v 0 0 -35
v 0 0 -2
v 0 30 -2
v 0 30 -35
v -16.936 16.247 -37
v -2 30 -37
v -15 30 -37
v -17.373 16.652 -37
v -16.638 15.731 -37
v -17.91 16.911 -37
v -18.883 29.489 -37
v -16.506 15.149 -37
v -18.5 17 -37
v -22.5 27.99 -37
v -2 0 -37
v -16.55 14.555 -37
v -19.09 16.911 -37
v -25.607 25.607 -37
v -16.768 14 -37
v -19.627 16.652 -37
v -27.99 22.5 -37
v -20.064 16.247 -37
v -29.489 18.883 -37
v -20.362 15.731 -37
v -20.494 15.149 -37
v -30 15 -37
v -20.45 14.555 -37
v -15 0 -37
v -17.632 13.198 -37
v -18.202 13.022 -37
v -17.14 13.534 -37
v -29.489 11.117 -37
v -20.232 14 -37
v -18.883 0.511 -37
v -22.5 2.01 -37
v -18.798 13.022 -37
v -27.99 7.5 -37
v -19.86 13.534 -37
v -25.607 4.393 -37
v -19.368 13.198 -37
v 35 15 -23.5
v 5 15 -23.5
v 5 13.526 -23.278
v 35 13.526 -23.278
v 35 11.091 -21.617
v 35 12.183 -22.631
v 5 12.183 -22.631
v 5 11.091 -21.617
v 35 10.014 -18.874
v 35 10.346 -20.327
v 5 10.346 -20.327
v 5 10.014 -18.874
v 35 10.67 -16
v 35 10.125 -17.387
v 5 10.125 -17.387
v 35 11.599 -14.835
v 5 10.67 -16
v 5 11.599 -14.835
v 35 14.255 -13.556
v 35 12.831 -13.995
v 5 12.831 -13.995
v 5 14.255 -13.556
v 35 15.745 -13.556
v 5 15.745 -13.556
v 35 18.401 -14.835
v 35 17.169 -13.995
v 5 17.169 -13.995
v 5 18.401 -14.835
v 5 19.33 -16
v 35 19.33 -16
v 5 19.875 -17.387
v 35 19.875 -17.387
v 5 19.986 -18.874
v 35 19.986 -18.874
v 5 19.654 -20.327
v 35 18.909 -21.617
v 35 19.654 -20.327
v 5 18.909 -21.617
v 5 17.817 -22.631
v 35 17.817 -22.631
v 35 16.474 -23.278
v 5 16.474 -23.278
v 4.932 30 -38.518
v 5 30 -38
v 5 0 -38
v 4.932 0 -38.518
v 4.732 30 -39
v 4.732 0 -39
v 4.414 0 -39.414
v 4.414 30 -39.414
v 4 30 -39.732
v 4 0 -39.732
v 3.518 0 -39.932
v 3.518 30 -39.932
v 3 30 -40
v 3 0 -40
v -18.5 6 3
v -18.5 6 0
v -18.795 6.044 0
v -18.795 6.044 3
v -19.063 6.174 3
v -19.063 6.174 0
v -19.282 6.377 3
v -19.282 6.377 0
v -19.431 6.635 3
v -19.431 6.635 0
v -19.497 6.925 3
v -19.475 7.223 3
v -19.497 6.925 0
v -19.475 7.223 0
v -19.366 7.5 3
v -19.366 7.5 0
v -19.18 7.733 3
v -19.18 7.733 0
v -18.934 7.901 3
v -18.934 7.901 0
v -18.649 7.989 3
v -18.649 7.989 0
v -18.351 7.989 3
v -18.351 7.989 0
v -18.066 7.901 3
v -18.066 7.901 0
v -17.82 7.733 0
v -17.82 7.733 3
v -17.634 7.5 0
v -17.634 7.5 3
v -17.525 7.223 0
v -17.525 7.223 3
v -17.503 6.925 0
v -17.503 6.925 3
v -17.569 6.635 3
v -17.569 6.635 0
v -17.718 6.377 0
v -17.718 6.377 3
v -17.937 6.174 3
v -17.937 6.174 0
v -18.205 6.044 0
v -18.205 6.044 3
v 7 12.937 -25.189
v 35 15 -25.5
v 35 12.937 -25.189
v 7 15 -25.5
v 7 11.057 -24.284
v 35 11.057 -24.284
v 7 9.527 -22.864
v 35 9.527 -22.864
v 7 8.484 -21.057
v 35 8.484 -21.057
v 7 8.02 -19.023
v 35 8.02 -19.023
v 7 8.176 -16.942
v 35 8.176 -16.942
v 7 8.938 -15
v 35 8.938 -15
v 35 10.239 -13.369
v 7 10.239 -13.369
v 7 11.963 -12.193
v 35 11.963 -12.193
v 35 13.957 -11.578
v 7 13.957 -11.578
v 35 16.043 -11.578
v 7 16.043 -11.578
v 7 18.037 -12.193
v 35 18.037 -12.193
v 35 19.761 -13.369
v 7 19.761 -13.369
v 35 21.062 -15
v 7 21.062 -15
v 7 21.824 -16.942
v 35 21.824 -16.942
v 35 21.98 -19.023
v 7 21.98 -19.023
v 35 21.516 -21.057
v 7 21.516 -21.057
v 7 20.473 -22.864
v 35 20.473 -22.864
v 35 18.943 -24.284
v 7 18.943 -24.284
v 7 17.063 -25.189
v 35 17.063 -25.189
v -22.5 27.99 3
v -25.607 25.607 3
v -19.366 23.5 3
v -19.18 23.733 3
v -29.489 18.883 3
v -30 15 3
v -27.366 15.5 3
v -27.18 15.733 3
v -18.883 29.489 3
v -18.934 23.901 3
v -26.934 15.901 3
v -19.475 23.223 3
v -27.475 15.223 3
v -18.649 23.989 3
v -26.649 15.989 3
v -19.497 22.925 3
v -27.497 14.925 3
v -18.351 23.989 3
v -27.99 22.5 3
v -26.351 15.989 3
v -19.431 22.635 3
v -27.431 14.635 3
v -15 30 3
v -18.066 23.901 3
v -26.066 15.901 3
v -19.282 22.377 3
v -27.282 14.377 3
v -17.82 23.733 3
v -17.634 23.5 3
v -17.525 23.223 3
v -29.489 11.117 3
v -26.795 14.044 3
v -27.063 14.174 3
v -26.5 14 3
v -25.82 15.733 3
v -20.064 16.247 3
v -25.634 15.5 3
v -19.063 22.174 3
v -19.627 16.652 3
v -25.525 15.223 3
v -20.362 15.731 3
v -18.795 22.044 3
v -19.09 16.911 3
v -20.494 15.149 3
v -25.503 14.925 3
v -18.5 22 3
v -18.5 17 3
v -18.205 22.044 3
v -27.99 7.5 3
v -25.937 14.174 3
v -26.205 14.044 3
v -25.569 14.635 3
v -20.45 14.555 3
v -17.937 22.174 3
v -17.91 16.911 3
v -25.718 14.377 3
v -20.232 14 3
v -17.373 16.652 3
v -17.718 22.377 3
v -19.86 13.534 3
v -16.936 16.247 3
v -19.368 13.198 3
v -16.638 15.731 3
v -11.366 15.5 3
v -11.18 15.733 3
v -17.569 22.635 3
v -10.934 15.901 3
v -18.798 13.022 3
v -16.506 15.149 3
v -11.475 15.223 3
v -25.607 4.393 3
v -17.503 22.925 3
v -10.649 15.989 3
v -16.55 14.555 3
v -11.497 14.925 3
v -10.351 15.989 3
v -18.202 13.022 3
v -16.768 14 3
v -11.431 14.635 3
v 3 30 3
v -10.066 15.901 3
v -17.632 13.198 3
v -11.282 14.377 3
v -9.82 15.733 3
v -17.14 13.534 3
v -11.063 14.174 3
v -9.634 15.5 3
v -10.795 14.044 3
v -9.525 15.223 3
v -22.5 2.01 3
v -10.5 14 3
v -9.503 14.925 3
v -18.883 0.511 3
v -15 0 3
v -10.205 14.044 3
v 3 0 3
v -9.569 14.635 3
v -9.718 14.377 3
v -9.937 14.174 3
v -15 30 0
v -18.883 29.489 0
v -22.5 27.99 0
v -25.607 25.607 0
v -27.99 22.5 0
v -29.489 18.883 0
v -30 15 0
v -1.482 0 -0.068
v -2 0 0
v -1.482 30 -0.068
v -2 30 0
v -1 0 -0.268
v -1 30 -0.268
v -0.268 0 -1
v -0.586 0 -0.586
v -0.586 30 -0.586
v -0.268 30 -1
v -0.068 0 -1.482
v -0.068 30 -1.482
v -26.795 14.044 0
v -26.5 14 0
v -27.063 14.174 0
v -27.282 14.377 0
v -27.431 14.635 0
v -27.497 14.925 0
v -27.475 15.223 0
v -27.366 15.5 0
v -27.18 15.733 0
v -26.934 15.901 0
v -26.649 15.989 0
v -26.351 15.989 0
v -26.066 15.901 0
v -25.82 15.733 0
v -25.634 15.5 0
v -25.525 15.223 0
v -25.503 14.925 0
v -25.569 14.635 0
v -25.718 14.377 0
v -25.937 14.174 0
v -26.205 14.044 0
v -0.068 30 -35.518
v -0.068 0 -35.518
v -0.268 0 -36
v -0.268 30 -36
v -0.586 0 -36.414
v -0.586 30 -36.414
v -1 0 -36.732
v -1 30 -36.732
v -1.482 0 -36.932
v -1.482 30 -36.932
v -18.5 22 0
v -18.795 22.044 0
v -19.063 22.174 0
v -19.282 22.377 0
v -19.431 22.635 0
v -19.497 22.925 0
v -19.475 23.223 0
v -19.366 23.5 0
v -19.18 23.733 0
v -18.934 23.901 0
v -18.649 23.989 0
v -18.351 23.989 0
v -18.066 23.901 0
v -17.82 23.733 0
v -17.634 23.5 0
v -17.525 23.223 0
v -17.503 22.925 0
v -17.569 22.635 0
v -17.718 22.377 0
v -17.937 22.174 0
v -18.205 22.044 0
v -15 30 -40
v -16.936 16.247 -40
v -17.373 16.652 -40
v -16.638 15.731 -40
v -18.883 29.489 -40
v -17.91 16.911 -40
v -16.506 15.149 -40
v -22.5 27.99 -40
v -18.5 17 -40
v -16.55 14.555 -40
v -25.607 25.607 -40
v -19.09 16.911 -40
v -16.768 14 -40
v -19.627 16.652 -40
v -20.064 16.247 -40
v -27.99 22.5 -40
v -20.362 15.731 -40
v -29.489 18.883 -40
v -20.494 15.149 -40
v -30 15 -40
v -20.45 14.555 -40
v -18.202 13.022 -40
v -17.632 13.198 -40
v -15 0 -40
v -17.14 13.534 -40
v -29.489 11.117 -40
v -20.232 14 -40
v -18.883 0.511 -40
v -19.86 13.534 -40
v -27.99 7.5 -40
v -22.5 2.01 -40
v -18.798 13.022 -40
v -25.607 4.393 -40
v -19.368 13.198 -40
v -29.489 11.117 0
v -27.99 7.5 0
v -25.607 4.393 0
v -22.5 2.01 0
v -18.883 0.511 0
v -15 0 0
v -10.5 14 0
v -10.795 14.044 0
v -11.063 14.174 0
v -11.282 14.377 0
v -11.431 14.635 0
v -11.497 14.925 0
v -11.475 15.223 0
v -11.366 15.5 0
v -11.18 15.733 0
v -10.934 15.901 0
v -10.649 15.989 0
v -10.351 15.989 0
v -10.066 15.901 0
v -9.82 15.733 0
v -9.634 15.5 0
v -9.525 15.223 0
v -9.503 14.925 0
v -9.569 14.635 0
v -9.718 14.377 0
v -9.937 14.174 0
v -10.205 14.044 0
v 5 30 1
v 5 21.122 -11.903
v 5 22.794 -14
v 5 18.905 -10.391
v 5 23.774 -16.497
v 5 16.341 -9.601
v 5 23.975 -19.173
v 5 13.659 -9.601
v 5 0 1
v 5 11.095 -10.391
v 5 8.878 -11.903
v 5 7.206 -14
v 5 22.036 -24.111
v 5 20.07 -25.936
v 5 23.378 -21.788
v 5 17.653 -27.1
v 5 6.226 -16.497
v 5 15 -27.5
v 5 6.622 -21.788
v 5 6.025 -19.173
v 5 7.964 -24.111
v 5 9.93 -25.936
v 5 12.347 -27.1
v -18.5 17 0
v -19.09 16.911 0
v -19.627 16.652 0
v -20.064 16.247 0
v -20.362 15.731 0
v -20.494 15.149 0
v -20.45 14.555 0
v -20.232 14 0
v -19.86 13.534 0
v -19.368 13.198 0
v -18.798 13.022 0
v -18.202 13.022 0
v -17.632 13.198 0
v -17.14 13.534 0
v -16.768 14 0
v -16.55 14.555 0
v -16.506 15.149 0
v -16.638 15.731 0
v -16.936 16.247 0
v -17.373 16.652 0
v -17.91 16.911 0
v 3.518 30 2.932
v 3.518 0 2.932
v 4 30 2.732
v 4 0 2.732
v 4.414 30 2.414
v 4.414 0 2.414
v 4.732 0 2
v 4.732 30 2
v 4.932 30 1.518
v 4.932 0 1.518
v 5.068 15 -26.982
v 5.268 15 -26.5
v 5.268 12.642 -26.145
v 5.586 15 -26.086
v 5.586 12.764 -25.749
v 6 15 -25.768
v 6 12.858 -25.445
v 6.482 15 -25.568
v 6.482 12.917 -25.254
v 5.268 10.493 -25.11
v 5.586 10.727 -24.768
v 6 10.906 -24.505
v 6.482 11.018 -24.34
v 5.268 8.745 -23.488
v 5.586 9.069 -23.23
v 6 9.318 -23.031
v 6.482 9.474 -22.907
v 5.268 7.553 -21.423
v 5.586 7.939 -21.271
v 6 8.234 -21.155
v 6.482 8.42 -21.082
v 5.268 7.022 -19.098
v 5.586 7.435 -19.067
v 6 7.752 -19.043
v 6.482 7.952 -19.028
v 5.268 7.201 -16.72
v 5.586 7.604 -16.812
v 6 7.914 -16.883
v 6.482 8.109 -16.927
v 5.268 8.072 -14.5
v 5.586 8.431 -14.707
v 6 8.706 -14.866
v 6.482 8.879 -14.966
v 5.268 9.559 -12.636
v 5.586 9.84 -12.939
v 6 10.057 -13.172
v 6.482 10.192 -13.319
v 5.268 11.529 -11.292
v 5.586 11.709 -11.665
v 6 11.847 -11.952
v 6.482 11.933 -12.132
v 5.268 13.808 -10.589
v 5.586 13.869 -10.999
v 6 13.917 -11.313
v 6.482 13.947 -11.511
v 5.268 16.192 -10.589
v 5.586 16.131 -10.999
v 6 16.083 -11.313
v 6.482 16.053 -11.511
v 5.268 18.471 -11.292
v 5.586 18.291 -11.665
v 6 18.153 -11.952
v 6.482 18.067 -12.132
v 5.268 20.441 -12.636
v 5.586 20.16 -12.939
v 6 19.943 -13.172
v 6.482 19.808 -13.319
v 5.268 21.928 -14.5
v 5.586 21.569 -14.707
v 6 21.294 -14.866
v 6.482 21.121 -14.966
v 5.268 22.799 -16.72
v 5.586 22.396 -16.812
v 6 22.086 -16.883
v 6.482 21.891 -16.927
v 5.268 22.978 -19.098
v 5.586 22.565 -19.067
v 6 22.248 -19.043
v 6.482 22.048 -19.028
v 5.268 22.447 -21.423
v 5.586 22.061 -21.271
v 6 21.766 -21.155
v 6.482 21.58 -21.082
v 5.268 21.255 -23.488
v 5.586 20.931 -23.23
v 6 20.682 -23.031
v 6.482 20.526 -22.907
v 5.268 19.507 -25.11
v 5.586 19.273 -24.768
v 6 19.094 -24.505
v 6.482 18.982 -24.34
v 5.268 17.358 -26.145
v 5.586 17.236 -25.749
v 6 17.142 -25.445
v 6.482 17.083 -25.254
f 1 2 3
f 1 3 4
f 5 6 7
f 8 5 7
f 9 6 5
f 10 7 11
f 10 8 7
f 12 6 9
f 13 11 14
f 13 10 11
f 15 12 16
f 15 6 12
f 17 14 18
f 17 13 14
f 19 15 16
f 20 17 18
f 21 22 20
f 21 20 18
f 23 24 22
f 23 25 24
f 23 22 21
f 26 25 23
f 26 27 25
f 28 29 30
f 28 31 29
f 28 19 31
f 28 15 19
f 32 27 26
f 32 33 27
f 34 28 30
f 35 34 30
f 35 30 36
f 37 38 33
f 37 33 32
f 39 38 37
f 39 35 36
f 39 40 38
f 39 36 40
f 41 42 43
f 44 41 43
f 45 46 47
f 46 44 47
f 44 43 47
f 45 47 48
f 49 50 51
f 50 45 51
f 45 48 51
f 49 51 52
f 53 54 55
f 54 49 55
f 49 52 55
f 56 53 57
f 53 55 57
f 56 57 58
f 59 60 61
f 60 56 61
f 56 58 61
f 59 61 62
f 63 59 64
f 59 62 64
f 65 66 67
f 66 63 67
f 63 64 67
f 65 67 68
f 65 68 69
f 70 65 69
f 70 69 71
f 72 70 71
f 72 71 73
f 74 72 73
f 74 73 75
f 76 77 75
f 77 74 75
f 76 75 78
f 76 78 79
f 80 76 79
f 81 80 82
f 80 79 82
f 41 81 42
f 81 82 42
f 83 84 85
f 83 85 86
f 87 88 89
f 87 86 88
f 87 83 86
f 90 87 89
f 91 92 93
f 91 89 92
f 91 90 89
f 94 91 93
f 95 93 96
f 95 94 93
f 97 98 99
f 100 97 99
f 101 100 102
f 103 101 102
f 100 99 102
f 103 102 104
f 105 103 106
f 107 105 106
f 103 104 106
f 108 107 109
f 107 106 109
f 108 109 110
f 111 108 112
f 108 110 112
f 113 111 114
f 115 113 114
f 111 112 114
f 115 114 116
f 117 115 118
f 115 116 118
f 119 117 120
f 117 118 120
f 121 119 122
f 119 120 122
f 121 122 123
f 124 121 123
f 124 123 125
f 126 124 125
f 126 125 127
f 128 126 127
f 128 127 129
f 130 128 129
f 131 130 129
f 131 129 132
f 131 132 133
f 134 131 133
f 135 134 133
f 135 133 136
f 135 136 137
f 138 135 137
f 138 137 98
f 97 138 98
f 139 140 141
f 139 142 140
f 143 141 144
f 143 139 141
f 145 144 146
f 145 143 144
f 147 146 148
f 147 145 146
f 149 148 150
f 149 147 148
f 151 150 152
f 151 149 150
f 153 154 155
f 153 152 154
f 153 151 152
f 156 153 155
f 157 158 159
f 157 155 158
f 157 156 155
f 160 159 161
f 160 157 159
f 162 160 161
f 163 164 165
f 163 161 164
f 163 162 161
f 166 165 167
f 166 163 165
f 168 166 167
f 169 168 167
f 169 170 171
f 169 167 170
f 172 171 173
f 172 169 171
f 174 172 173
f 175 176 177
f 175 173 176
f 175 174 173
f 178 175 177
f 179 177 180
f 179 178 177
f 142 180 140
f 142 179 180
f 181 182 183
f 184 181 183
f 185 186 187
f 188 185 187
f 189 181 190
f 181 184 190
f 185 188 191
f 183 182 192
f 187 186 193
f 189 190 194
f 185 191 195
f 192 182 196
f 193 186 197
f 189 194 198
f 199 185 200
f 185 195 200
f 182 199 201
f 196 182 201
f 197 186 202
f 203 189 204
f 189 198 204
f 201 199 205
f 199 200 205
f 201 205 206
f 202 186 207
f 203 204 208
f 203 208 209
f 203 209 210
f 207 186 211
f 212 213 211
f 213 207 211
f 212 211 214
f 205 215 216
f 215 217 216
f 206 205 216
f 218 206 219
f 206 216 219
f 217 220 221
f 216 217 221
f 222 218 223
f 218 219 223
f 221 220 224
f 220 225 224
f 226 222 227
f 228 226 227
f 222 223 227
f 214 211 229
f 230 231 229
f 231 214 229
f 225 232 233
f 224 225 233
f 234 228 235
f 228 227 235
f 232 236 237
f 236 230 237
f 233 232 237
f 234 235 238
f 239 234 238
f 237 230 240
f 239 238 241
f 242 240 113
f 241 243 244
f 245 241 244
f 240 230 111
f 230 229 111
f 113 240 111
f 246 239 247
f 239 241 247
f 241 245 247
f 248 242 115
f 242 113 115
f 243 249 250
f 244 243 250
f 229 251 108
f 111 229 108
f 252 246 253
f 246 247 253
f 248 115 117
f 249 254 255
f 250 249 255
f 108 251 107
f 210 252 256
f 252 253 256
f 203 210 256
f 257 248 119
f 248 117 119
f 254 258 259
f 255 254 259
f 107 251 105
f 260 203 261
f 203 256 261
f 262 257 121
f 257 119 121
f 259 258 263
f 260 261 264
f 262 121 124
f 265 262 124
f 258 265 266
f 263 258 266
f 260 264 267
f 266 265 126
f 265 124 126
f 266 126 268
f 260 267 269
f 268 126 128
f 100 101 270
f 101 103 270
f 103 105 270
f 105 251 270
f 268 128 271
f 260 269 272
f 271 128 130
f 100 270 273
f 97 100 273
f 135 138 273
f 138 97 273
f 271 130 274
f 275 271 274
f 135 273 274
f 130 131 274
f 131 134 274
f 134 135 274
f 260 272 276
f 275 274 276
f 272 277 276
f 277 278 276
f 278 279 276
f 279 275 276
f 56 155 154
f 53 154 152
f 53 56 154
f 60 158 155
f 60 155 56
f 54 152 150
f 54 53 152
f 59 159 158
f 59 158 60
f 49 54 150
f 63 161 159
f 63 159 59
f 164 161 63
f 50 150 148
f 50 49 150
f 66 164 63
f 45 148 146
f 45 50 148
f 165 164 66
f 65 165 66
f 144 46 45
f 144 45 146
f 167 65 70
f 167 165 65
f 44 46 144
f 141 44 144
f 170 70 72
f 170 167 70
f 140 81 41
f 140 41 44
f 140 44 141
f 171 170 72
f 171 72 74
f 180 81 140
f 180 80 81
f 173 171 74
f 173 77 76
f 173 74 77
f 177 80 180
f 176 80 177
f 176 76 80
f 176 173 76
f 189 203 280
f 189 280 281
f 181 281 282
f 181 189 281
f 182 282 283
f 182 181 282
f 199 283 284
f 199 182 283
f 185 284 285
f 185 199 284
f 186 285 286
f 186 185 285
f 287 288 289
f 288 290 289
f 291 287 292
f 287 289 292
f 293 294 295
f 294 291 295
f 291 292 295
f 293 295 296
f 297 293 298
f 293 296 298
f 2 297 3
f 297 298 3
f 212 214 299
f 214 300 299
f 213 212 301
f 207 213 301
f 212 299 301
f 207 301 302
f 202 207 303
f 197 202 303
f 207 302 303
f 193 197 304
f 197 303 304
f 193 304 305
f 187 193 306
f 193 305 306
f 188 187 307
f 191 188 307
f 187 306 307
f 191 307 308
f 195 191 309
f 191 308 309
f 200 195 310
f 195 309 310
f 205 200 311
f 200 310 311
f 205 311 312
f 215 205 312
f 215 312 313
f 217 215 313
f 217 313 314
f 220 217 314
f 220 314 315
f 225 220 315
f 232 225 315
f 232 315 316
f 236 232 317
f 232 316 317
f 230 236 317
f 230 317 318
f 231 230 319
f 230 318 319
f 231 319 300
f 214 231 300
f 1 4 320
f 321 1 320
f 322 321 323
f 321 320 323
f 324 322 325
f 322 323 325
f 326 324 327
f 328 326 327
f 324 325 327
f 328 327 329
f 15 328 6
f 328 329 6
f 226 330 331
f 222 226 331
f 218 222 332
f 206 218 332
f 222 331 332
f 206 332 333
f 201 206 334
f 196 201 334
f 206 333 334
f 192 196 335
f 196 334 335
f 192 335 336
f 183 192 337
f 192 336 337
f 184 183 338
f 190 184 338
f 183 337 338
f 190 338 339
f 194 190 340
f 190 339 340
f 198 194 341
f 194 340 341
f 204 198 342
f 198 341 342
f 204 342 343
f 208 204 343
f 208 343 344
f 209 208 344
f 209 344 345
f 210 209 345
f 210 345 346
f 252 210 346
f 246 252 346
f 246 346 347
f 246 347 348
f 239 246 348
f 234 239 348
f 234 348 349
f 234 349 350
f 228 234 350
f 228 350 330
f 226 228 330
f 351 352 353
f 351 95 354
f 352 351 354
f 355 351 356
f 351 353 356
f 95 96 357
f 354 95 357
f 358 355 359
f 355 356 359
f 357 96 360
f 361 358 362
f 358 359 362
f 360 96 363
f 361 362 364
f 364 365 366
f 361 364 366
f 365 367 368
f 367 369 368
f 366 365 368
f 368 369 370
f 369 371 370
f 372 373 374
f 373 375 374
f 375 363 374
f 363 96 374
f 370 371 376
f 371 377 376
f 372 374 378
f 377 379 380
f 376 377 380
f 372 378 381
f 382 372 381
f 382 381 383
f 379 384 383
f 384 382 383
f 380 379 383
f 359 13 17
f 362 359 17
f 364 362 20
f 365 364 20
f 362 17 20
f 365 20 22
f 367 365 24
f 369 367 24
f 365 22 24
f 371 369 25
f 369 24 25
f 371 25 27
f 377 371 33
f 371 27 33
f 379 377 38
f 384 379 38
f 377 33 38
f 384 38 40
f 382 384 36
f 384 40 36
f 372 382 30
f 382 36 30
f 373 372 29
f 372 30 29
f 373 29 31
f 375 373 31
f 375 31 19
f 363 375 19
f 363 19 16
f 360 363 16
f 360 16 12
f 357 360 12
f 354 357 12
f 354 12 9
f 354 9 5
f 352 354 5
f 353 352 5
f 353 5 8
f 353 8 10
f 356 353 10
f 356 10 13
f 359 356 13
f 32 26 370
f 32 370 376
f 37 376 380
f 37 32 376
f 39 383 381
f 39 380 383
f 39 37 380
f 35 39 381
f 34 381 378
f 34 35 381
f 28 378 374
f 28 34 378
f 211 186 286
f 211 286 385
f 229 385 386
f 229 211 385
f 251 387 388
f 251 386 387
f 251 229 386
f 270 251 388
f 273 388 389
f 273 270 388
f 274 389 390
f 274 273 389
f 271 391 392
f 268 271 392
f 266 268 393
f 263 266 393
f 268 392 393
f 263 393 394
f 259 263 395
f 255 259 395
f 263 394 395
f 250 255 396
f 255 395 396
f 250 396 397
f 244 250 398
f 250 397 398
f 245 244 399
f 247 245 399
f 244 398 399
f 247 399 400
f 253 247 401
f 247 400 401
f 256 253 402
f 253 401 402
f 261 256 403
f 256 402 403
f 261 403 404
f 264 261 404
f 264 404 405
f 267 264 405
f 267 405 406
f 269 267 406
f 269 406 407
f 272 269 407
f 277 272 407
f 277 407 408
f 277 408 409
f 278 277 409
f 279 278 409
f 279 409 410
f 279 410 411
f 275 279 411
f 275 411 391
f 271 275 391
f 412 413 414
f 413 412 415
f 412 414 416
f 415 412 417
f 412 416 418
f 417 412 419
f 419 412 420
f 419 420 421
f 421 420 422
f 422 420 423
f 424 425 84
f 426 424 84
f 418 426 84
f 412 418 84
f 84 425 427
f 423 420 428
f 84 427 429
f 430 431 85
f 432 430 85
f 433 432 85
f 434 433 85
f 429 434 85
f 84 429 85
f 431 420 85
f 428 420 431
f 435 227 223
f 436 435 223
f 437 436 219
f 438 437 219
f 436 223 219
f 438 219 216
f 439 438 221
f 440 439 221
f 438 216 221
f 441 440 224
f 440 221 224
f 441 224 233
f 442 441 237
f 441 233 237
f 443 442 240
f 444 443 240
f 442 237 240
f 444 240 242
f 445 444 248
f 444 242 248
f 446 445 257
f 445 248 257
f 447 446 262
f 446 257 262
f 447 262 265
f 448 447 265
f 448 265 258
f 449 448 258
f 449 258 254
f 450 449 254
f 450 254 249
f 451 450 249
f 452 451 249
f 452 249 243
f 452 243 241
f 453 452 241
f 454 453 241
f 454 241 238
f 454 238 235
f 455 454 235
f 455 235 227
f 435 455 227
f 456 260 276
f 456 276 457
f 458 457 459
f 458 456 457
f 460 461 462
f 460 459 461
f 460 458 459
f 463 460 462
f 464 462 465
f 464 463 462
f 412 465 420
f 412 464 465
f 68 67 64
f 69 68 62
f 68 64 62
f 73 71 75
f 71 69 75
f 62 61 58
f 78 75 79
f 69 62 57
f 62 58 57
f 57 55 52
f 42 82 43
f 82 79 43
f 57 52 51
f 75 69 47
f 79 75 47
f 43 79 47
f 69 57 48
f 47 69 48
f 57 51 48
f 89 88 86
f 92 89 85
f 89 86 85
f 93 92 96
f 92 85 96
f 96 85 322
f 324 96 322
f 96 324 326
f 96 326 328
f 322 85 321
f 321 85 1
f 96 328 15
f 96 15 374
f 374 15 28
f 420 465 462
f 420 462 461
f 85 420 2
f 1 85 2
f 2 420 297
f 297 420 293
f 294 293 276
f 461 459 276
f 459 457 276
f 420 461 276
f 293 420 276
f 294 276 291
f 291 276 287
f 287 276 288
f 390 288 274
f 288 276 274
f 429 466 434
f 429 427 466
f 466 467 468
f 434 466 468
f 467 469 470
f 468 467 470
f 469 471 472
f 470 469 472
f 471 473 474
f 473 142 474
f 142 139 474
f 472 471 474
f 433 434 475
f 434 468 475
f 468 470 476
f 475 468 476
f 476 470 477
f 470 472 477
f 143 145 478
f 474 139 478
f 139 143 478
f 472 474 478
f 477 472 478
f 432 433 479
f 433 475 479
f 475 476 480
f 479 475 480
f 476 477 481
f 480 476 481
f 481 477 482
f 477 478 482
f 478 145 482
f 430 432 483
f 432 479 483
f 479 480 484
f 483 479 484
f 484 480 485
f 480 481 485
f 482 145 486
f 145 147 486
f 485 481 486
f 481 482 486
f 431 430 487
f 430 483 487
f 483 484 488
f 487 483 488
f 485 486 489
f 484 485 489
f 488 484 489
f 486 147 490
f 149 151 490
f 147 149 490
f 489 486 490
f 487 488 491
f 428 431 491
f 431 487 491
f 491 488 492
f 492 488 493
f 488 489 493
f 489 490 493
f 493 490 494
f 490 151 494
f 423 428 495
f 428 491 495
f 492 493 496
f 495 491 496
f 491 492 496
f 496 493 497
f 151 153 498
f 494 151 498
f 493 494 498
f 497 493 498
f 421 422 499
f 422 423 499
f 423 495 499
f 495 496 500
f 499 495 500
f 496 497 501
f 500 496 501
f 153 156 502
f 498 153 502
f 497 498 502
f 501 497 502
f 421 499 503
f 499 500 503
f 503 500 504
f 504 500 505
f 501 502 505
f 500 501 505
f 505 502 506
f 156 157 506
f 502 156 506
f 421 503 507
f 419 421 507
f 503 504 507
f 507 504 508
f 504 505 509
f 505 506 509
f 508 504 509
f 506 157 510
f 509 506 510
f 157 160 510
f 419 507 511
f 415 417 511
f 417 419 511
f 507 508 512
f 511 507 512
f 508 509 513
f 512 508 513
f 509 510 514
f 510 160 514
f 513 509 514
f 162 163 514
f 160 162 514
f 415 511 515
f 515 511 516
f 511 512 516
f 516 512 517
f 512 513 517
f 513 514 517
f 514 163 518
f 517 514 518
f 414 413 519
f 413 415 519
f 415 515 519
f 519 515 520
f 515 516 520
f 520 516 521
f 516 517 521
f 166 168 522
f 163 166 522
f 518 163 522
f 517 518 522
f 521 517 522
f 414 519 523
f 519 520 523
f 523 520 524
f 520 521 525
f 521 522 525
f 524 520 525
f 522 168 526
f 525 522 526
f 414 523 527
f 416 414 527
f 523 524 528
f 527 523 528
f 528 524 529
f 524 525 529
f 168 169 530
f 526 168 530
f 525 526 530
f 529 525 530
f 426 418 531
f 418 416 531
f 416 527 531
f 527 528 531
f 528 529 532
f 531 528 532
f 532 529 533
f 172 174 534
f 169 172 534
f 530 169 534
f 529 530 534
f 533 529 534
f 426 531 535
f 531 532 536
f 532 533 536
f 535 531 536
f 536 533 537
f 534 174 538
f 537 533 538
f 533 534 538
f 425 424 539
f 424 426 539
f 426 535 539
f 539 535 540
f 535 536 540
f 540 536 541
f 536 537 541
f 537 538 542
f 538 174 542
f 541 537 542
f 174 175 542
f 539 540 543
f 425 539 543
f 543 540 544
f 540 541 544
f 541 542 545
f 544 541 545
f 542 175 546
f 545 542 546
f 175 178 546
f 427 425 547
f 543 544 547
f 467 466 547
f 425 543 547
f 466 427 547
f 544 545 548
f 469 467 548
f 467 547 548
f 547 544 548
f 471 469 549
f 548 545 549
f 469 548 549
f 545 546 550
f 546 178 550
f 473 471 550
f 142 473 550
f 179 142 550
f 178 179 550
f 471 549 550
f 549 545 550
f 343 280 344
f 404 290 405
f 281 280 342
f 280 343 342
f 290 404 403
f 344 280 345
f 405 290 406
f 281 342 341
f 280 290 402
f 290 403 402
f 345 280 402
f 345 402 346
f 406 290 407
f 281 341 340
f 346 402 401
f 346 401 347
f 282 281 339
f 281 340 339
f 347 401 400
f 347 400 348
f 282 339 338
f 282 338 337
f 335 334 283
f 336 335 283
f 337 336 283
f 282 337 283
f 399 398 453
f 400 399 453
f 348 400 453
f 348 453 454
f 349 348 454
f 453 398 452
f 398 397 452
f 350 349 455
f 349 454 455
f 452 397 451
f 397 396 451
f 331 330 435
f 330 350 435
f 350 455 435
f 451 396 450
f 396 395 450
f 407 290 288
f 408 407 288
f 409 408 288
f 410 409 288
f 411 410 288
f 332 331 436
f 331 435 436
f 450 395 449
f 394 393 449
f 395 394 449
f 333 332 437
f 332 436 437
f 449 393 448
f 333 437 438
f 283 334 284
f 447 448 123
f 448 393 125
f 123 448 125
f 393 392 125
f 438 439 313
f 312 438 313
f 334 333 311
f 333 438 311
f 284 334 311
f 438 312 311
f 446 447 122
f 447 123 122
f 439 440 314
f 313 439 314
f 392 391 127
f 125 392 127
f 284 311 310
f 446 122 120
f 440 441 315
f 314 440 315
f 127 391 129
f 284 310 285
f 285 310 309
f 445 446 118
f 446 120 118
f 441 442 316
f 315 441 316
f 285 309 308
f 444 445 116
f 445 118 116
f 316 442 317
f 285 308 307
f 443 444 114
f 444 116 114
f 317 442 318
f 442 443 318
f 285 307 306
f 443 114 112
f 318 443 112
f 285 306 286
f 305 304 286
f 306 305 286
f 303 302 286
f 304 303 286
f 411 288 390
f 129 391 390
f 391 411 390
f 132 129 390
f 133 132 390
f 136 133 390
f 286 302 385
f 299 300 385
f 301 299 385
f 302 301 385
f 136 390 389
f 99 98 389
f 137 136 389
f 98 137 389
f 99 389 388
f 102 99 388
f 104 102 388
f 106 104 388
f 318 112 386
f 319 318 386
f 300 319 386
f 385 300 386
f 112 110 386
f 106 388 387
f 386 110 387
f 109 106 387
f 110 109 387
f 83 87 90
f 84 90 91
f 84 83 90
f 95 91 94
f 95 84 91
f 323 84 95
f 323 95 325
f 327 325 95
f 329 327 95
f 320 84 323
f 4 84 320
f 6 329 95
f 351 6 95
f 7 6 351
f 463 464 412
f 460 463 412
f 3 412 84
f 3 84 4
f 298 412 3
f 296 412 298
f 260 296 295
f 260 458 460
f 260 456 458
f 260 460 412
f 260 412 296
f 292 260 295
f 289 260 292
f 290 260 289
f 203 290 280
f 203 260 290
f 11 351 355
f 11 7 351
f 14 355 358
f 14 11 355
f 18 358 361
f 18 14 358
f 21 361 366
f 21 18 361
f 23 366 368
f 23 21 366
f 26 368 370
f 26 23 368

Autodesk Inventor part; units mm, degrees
ref_plane "YZ Plane" through (0, 0, 0) normal (1, 0, 0) x (0, 1, 0)
ref_plane "XZ Plane" through (0, 0, 0) normal (0, 1, 0) x (-1, 0, 0)
ref_plane "XY Plane" through (0, 0, 0) normal (0, 0, 1) x (1, 0, 0)
sketch "Sketch1" plane through (0, 0, 0) normal (0, 1, 0) x (-1, 0, 0)
  line L0 (0, 0) -> (30, 0)
  line L1 (0, 0) -> (0, -37)
  line L2 (0, -37) -> (30, -37)
  line L3 (30, 0) -> (30, 3)
  line L4 (30, 3) -> (-5, 3)
  line L5 (-5, 3) -> (-5, -40)
  line L6 (-5, -40) -> (30, -40)
  line L7 (30, -40) -> (30, -37)
  dimension "d0" = 30
  dimension "d1" = 37
  dimension "d2" = 30
  dimension "d3" = 90
  dimension "d4" = 3
  dimension "d5" = 35
  dimension "d6" = 43
extrude "Extrusion1" add sketch "Sketch1" along normal blind 30
fillet "Fillet1" radius 2 4 edges at (5, 15, 3) (5, 15, -40) (0, 15, -37) (0, 15, 0)
sketch "Sketch2" plane through (5, 0, 1) normal (1, 0, 0) x (0, 0, -1)
  line L0 (39, 30) -> (39, 0) projected
  line L1 (0, 30) -> (39, 30) projected
  line L2 (0, 0) -> (0, 30) projected
  line L3 (0, 0) -> (39, 0) projected
  circle A0 centre (19.5, 15) radius 5
  circle A1 centre (19.5, 15) radius 7
  point P0 (1, 0)
  dimension "d10" = 10
  dimension "d11" = 14
extrude "Extrusion2" add sketch "Sketch2" along normal blind 30 contours A1
fillet "Fillet2" radius 2 1 edges at (5, 15, -11.5)
fillet "Fillet3" radius 15 4 edges at (-30, 30, 1.5) (-30, 0, 1.5) (-30, 30, -38.5) (-30, 0, -38.5)
sketch "Sketch3" plane through (3, 0, 3) normal (0, 0, 1) x (1, 0, 0)
  arc A0 (-18, 30) -> (-18, 0) centre (-18, 15) ccw projected
  line L0 (-18, 0) -> (0, 0) projected
  line L1 (0, 30) -> (0, 0) projected
  line L2 (-18, 30) -> (0, 30) projected
  circle A1 centre (-21.5, 15) radius 11
  point P0 (-3, 0)
  point P1 (-29.5, 15)
  point P2 (-21.5, 23)
  point P3 (-13.5, 15)
  point P4 (-21.5, 7)
  dimension "d16" = 22
  dimension "d18" = 8
  dimension "d19" = 8
  dimension "d20" = 8
  dimension "d21" = 8
hole "Hole1" at (-18.5, 15, 3) at (-26.5, 15, 3) at (-18.5, 23, 3) at (-10.5, 15, 3) at (-18.5, 7, 3) direction (0, 0, -1) diameter 2 depth 8 tip angle 118
sketch "Sketch4" plane through (3, 0, -40) normal (0, 0, -1) x (-1, 0, 0)
  circle A0 centre (13.5, 15) radius 1 projected
  circle A1 centre (29.5, 15) radius 1 projected
  circle A2 centre (21.5, 15) radius 1 projected
  circle A3 centre (21.5, 23) radius 1 projected
  circle A4 centre (21.5, 7) radius 1 projected
  arc A5 (18, 0) -> (18, 30) centre (18, 15) ccw projected
  line L0 (5, 30) -> (18, 30) projected
  line L1 (5, 0) -> (5, 30) projected
  line L2 (5, 0) -> (18, 0) projected
  point P0 (3, 0)
hole "Hole2" at (-18.5, 15, -40) direction (0, 0, 1) diameter 4 end through all
properties part number "Pen"
